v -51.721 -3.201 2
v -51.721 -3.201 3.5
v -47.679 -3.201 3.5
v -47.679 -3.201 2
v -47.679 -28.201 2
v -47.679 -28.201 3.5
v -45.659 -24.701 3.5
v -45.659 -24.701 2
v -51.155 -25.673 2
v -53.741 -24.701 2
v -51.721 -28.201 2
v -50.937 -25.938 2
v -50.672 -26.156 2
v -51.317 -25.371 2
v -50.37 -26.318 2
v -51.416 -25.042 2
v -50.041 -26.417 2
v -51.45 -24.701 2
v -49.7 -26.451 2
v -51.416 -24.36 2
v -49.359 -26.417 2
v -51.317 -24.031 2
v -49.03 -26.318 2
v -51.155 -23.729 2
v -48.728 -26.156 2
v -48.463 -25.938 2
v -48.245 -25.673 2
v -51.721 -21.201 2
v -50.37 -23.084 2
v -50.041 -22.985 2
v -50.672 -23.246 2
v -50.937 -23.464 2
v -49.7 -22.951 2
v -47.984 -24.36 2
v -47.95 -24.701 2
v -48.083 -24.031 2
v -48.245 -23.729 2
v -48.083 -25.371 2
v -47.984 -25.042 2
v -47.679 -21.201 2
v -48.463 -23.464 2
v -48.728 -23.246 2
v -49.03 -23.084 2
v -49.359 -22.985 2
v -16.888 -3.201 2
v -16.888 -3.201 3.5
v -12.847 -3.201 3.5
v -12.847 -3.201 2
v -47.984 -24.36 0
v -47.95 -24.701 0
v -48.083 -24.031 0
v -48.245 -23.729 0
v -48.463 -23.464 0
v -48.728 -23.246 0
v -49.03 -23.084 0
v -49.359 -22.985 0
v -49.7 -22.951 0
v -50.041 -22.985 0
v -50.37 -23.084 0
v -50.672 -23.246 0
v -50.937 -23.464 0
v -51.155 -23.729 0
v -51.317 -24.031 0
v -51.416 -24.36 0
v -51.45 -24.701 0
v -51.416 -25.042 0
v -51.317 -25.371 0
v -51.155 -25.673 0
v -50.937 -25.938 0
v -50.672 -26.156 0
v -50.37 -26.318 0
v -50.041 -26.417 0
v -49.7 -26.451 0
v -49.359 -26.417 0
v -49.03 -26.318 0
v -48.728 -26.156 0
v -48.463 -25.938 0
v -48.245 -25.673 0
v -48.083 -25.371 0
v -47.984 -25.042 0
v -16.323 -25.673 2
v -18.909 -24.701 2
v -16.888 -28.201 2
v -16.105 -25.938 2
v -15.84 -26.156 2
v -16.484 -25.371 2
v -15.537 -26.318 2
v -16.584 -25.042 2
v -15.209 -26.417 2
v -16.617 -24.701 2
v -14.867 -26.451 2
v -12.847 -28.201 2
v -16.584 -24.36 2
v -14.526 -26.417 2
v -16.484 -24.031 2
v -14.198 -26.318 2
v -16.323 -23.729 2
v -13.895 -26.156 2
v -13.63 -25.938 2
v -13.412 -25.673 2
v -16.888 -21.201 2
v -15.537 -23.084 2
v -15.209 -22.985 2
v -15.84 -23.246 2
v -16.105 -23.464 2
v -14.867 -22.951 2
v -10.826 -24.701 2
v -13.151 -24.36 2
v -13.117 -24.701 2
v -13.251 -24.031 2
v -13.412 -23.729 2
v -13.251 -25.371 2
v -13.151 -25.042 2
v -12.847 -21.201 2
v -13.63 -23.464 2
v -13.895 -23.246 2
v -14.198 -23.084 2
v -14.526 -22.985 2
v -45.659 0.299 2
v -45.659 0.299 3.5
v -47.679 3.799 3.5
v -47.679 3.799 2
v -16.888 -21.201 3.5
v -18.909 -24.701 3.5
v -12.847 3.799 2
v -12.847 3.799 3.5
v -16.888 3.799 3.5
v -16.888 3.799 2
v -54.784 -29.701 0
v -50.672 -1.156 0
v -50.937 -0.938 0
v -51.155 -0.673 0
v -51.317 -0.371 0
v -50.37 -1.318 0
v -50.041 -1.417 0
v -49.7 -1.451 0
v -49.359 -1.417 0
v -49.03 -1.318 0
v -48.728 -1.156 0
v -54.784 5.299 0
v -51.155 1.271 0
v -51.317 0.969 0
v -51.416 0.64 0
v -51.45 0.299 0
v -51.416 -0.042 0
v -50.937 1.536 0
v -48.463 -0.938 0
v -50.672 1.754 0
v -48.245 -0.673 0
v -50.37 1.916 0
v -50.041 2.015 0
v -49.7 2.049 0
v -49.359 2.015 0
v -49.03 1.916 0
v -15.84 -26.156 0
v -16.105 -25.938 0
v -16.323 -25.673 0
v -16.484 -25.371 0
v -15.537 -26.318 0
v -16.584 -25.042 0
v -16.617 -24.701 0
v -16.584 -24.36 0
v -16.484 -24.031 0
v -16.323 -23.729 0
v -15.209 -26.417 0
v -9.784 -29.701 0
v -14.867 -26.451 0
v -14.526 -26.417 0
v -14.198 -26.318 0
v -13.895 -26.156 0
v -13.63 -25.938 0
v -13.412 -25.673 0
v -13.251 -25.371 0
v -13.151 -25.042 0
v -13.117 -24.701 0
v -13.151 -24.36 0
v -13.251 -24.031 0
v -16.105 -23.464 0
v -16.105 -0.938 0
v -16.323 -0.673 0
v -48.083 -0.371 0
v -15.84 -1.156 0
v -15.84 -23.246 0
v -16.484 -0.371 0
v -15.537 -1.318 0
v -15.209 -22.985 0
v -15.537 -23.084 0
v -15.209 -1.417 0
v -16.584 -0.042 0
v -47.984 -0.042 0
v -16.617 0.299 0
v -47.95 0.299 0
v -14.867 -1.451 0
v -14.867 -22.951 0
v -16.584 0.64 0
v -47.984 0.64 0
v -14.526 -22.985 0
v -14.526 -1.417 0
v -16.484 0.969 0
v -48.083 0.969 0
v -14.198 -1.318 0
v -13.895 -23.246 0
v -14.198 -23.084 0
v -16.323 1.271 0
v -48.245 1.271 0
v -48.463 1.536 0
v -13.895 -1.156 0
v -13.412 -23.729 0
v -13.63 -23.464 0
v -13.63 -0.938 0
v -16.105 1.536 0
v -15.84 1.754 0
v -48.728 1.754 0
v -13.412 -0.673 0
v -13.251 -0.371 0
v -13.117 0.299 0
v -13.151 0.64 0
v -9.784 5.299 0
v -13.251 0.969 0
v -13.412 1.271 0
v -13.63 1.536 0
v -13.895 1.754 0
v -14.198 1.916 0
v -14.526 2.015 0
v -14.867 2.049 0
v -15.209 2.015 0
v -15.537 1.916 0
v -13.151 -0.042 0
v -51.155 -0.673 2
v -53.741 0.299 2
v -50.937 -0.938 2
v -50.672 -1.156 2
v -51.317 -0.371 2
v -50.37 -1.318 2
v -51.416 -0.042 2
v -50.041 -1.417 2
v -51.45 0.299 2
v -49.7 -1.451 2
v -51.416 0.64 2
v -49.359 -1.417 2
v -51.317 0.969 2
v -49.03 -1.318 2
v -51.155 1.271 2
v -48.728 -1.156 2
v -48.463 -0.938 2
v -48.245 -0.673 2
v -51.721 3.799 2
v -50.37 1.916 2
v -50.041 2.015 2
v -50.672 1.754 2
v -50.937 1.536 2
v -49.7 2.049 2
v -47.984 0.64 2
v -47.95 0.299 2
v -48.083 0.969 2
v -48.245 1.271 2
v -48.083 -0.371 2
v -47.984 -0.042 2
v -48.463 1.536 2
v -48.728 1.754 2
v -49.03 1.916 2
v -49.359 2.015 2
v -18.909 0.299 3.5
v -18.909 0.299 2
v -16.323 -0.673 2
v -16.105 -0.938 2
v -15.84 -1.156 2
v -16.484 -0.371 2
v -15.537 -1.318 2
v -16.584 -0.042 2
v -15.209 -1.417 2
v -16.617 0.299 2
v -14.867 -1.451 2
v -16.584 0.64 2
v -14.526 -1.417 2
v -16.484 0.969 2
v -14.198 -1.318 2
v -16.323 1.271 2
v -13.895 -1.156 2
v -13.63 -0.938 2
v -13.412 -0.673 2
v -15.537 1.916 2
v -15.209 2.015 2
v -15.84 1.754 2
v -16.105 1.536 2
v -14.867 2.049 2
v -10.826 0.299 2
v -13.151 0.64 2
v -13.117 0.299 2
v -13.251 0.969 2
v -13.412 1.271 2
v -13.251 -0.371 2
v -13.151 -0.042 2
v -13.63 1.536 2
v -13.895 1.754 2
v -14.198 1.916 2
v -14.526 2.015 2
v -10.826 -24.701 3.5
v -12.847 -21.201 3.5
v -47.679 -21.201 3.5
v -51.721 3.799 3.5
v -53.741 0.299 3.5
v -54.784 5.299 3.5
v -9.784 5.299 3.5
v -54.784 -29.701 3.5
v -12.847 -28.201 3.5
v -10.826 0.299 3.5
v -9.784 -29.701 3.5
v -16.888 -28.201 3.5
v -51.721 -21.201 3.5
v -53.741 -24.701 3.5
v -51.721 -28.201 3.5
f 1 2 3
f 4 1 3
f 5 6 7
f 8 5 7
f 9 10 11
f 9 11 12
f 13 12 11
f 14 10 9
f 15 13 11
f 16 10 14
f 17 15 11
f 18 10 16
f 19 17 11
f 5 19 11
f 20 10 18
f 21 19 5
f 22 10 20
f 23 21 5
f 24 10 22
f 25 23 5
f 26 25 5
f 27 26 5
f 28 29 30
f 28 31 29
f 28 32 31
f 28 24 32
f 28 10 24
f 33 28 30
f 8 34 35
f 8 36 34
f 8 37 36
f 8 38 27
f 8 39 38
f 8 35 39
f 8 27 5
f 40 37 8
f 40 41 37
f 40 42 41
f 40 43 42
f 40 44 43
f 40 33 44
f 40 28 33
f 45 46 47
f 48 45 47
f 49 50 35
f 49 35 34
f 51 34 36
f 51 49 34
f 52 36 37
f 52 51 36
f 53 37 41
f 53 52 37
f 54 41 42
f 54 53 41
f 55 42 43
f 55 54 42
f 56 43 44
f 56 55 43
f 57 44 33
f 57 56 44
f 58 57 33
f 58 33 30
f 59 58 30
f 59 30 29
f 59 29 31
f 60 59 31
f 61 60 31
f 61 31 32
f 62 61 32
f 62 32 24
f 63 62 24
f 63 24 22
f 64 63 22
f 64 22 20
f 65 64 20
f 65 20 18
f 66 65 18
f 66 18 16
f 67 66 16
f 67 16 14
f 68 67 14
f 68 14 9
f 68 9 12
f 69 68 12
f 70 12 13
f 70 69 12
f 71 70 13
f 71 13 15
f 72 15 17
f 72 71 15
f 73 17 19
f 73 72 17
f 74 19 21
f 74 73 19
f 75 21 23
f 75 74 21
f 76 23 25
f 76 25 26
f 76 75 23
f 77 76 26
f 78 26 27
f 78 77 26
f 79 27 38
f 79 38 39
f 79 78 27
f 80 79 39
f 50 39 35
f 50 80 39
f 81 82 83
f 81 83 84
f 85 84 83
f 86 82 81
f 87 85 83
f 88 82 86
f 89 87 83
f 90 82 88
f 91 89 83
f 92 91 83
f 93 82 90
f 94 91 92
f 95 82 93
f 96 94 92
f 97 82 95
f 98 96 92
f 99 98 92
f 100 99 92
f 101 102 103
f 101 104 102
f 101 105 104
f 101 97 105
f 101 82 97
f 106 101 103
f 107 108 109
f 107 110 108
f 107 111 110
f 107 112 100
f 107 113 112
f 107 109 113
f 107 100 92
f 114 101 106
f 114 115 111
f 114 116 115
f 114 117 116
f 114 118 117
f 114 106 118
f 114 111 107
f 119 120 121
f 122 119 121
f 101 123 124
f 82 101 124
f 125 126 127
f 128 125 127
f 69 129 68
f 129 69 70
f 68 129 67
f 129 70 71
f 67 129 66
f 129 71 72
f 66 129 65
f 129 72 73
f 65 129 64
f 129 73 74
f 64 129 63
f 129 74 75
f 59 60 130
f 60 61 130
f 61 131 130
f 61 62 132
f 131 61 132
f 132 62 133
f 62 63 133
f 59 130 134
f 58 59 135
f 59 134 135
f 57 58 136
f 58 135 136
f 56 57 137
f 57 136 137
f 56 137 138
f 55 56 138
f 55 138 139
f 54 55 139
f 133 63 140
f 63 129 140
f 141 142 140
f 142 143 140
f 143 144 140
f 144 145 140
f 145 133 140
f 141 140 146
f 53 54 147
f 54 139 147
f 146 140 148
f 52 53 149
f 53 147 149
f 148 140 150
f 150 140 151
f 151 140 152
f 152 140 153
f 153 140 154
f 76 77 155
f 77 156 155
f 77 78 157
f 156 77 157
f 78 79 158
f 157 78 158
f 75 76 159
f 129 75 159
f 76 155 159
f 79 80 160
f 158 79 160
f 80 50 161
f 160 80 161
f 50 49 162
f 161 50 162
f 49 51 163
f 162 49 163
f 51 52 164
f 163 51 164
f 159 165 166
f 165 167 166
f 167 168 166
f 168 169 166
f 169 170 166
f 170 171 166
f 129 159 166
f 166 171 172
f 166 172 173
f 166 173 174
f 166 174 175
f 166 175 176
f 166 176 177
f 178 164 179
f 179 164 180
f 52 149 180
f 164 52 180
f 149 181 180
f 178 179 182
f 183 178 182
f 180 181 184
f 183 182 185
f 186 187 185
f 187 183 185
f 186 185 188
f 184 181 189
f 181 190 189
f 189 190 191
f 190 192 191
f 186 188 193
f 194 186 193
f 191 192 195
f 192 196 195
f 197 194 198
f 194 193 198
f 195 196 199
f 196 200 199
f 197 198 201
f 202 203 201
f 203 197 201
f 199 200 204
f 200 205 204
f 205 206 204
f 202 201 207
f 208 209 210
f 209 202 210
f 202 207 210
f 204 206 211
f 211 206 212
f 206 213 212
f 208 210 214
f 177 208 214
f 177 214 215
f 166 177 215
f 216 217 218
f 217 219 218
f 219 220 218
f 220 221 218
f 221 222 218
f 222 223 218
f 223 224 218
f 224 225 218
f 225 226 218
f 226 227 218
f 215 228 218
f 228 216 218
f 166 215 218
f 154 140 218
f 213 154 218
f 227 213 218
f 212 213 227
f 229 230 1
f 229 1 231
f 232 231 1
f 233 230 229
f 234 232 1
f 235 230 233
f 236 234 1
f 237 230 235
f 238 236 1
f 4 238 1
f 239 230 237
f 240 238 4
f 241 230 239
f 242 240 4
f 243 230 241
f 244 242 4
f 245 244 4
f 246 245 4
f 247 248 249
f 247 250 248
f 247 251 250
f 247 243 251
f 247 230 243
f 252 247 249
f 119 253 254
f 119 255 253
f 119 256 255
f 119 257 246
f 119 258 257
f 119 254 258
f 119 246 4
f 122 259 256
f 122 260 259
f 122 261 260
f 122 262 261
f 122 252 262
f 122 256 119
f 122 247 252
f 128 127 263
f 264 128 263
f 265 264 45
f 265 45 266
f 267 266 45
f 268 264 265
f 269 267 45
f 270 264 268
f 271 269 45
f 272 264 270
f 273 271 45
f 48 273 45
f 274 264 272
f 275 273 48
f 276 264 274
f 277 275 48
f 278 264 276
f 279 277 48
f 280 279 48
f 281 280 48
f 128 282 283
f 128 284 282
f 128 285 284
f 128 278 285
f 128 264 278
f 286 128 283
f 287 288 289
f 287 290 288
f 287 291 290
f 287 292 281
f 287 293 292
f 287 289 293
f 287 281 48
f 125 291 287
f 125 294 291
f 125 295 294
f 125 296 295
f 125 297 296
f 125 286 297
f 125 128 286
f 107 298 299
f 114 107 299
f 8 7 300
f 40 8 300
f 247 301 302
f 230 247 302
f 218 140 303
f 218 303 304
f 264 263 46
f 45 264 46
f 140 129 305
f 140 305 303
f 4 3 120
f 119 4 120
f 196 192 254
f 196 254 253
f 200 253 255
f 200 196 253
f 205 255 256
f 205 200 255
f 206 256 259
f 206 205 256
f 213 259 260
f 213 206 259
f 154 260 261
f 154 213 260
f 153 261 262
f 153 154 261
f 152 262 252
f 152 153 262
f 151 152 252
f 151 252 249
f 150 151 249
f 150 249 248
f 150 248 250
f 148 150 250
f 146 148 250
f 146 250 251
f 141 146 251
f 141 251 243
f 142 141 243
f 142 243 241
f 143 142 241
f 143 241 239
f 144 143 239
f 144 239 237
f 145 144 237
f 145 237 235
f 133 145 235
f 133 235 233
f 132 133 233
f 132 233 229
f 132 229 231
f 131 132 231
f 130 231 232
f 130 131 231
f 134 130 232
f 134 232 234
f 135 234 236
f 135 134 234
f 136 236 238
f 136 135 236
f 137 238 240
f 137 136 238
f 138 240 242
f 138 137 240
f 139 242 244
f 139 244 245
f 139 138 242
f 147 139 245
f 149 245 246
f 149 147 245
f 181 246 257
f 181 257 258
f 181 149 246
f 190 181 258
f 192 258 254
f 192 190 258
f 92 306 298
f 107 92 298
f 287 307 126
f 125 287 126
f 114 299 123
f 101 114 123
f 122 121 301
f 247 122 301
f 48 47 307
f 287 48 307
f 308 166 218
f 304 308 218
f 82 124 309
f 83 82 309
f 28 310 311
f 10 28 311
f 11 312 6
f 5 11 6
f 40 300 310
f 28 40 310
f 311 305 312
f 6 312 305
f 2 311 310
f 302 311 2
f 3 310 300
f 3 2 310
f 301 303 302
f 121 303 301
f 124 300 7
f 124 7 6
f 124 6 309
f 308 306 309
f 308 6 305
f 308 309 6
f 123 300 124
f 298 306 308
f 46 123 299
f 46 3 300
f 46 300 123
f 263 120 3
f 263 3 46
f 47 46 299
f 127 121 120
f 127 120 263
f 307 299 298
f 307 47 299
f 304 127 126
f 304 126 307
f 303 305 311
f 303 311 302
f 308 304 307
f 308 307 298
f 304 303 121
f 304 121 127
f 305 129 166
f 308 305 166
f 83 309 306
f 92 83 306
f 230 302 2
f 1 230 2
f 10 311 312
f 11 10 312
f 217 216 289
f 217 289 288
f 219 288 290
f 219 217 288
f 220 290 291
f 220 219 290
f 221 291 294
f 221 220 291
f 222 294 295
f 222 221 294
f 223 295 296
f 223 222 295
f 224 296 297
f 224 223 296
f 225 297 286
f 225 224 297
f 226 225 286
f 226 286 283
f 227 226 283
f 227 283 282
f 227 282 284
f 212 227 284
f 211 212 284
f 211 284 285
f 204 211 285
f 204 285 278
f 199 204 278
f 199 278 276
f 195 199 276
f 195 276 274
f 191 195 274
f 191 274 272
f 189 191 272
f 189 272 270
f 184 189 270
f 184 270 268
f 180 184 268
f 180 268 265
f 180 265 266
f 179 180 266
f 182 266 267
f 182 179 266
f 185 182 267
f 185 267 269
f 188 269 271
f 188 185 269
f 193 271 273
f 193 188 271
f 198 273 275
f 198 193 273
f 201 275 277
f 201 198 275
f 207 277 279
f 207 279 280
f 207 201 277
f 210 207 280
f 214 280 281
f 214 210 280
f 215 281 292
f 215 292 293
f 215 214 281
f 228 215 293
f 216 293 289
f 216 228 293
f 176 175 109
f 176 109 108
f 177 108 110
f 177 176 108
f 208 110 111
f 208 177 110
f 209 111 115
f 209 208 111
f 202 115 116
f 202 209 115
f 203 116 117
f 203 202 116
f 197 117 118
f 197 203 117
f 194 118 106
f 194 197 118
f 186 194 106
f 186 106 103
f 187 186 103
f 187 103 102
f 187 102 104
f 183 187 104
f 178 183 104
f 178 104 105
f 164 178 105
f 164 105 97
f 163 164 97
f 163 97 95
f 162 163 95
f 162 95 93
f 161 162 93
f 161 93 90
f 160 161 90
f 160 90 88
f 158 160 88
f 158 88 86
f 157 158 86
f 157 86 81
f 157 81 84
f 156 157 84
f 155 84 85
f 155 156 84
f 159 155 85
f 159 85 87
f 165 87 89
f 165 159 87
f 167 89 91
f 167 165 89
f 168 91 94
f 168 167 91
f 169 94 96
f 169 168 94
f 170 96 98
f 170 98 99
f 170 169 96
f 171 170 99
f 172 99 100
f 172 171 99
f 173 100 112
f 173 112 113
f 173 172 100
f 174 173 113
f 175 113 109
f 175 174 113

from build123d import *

# Parameters (mm, degrees)
F1_W     = 45
F1_H     = 35
F1_R     = 1.75
F2_DEPTH = 3.5
F3_R     = 1.75
F4_DEPTH = 1.5


with BuildPart() as f2:
    # F1 (on face) → F2 (new body)
    with BuildSketch(Plane.XY):
        with Locations((-32.283769, -12.20101)):
            Rectangle(F1_W, F1_H)
        with Locations((-49.70004, -24.70101)):
            Circle(F1_R, mode=Mode.SUBTRACT)
        with Locations((-14.867499, -24.70101)):
            Circle(F1_R, mode=Mode.SUBTRACT)
        with Locations((-49.70004, 0.29899)):
            Circle(F1_R, mode=Mode.SUBTRACT)
        with Locations((-14.867499, 0.29899)):
            Circle(F1_R, mode=Mode.SUBTRACT)
    extrude(amount=F2_DEPTH)

    # F3 (on face) → F4 (cut)
    with BuildSketch(Plane.XY.offset(3.5)):
        Polygon((-45.658588, -24.70101), (-47.679314, -21.20101), (-51.720766, -21.20101), (-53.741492, -24.70101), (-51.720766, -28.20101), (-47.679314, -28.20101), align=None)
        with Locations((-49.70004, -24.70101)):
            Circle(F3_R, mode=Mode.SUBTRACT)
        Polygon((-45.658588, 0.29899), (-47.679314, 3.79899), (-51.720766, 3.79899), (-53.741492, 0.29899), (-51.720766, -3.20101), (-47.679314, -3.20101), align=None)
        with Locations((-49.70004, 0.29899)):
            Circle(F3_R, mode=Mode.SUBTRACT)
        Polygon((-16.888224, 3.79899), (-18.90895, 0.29899), (-16.888224, -3.20101), (-12.846773, -3.20101), (-10.826047, 0.29899), (-12.846773, 3.79899), align=None)
        with Locations((-14.867499, 0.29899)):
            Circle(F3_R, mode=Mode.SUBTRACT)
        Polygon((-12.846773, -21.20101), (-16.888224, -21.20101), (-18.90895, -24.70101), (-16.888224, -28.20101), (-12.846773, -28.20101), (-10.826047, -24.70101), align=None)
        with Locations((-14.867499, -24.70101)):
            Circle(F3_R, mode=Mode.SUBTRACT)
    extrude(amount=-F4_DEPTH, mode=Mode.SUBTRACT)


solid = f2.part
